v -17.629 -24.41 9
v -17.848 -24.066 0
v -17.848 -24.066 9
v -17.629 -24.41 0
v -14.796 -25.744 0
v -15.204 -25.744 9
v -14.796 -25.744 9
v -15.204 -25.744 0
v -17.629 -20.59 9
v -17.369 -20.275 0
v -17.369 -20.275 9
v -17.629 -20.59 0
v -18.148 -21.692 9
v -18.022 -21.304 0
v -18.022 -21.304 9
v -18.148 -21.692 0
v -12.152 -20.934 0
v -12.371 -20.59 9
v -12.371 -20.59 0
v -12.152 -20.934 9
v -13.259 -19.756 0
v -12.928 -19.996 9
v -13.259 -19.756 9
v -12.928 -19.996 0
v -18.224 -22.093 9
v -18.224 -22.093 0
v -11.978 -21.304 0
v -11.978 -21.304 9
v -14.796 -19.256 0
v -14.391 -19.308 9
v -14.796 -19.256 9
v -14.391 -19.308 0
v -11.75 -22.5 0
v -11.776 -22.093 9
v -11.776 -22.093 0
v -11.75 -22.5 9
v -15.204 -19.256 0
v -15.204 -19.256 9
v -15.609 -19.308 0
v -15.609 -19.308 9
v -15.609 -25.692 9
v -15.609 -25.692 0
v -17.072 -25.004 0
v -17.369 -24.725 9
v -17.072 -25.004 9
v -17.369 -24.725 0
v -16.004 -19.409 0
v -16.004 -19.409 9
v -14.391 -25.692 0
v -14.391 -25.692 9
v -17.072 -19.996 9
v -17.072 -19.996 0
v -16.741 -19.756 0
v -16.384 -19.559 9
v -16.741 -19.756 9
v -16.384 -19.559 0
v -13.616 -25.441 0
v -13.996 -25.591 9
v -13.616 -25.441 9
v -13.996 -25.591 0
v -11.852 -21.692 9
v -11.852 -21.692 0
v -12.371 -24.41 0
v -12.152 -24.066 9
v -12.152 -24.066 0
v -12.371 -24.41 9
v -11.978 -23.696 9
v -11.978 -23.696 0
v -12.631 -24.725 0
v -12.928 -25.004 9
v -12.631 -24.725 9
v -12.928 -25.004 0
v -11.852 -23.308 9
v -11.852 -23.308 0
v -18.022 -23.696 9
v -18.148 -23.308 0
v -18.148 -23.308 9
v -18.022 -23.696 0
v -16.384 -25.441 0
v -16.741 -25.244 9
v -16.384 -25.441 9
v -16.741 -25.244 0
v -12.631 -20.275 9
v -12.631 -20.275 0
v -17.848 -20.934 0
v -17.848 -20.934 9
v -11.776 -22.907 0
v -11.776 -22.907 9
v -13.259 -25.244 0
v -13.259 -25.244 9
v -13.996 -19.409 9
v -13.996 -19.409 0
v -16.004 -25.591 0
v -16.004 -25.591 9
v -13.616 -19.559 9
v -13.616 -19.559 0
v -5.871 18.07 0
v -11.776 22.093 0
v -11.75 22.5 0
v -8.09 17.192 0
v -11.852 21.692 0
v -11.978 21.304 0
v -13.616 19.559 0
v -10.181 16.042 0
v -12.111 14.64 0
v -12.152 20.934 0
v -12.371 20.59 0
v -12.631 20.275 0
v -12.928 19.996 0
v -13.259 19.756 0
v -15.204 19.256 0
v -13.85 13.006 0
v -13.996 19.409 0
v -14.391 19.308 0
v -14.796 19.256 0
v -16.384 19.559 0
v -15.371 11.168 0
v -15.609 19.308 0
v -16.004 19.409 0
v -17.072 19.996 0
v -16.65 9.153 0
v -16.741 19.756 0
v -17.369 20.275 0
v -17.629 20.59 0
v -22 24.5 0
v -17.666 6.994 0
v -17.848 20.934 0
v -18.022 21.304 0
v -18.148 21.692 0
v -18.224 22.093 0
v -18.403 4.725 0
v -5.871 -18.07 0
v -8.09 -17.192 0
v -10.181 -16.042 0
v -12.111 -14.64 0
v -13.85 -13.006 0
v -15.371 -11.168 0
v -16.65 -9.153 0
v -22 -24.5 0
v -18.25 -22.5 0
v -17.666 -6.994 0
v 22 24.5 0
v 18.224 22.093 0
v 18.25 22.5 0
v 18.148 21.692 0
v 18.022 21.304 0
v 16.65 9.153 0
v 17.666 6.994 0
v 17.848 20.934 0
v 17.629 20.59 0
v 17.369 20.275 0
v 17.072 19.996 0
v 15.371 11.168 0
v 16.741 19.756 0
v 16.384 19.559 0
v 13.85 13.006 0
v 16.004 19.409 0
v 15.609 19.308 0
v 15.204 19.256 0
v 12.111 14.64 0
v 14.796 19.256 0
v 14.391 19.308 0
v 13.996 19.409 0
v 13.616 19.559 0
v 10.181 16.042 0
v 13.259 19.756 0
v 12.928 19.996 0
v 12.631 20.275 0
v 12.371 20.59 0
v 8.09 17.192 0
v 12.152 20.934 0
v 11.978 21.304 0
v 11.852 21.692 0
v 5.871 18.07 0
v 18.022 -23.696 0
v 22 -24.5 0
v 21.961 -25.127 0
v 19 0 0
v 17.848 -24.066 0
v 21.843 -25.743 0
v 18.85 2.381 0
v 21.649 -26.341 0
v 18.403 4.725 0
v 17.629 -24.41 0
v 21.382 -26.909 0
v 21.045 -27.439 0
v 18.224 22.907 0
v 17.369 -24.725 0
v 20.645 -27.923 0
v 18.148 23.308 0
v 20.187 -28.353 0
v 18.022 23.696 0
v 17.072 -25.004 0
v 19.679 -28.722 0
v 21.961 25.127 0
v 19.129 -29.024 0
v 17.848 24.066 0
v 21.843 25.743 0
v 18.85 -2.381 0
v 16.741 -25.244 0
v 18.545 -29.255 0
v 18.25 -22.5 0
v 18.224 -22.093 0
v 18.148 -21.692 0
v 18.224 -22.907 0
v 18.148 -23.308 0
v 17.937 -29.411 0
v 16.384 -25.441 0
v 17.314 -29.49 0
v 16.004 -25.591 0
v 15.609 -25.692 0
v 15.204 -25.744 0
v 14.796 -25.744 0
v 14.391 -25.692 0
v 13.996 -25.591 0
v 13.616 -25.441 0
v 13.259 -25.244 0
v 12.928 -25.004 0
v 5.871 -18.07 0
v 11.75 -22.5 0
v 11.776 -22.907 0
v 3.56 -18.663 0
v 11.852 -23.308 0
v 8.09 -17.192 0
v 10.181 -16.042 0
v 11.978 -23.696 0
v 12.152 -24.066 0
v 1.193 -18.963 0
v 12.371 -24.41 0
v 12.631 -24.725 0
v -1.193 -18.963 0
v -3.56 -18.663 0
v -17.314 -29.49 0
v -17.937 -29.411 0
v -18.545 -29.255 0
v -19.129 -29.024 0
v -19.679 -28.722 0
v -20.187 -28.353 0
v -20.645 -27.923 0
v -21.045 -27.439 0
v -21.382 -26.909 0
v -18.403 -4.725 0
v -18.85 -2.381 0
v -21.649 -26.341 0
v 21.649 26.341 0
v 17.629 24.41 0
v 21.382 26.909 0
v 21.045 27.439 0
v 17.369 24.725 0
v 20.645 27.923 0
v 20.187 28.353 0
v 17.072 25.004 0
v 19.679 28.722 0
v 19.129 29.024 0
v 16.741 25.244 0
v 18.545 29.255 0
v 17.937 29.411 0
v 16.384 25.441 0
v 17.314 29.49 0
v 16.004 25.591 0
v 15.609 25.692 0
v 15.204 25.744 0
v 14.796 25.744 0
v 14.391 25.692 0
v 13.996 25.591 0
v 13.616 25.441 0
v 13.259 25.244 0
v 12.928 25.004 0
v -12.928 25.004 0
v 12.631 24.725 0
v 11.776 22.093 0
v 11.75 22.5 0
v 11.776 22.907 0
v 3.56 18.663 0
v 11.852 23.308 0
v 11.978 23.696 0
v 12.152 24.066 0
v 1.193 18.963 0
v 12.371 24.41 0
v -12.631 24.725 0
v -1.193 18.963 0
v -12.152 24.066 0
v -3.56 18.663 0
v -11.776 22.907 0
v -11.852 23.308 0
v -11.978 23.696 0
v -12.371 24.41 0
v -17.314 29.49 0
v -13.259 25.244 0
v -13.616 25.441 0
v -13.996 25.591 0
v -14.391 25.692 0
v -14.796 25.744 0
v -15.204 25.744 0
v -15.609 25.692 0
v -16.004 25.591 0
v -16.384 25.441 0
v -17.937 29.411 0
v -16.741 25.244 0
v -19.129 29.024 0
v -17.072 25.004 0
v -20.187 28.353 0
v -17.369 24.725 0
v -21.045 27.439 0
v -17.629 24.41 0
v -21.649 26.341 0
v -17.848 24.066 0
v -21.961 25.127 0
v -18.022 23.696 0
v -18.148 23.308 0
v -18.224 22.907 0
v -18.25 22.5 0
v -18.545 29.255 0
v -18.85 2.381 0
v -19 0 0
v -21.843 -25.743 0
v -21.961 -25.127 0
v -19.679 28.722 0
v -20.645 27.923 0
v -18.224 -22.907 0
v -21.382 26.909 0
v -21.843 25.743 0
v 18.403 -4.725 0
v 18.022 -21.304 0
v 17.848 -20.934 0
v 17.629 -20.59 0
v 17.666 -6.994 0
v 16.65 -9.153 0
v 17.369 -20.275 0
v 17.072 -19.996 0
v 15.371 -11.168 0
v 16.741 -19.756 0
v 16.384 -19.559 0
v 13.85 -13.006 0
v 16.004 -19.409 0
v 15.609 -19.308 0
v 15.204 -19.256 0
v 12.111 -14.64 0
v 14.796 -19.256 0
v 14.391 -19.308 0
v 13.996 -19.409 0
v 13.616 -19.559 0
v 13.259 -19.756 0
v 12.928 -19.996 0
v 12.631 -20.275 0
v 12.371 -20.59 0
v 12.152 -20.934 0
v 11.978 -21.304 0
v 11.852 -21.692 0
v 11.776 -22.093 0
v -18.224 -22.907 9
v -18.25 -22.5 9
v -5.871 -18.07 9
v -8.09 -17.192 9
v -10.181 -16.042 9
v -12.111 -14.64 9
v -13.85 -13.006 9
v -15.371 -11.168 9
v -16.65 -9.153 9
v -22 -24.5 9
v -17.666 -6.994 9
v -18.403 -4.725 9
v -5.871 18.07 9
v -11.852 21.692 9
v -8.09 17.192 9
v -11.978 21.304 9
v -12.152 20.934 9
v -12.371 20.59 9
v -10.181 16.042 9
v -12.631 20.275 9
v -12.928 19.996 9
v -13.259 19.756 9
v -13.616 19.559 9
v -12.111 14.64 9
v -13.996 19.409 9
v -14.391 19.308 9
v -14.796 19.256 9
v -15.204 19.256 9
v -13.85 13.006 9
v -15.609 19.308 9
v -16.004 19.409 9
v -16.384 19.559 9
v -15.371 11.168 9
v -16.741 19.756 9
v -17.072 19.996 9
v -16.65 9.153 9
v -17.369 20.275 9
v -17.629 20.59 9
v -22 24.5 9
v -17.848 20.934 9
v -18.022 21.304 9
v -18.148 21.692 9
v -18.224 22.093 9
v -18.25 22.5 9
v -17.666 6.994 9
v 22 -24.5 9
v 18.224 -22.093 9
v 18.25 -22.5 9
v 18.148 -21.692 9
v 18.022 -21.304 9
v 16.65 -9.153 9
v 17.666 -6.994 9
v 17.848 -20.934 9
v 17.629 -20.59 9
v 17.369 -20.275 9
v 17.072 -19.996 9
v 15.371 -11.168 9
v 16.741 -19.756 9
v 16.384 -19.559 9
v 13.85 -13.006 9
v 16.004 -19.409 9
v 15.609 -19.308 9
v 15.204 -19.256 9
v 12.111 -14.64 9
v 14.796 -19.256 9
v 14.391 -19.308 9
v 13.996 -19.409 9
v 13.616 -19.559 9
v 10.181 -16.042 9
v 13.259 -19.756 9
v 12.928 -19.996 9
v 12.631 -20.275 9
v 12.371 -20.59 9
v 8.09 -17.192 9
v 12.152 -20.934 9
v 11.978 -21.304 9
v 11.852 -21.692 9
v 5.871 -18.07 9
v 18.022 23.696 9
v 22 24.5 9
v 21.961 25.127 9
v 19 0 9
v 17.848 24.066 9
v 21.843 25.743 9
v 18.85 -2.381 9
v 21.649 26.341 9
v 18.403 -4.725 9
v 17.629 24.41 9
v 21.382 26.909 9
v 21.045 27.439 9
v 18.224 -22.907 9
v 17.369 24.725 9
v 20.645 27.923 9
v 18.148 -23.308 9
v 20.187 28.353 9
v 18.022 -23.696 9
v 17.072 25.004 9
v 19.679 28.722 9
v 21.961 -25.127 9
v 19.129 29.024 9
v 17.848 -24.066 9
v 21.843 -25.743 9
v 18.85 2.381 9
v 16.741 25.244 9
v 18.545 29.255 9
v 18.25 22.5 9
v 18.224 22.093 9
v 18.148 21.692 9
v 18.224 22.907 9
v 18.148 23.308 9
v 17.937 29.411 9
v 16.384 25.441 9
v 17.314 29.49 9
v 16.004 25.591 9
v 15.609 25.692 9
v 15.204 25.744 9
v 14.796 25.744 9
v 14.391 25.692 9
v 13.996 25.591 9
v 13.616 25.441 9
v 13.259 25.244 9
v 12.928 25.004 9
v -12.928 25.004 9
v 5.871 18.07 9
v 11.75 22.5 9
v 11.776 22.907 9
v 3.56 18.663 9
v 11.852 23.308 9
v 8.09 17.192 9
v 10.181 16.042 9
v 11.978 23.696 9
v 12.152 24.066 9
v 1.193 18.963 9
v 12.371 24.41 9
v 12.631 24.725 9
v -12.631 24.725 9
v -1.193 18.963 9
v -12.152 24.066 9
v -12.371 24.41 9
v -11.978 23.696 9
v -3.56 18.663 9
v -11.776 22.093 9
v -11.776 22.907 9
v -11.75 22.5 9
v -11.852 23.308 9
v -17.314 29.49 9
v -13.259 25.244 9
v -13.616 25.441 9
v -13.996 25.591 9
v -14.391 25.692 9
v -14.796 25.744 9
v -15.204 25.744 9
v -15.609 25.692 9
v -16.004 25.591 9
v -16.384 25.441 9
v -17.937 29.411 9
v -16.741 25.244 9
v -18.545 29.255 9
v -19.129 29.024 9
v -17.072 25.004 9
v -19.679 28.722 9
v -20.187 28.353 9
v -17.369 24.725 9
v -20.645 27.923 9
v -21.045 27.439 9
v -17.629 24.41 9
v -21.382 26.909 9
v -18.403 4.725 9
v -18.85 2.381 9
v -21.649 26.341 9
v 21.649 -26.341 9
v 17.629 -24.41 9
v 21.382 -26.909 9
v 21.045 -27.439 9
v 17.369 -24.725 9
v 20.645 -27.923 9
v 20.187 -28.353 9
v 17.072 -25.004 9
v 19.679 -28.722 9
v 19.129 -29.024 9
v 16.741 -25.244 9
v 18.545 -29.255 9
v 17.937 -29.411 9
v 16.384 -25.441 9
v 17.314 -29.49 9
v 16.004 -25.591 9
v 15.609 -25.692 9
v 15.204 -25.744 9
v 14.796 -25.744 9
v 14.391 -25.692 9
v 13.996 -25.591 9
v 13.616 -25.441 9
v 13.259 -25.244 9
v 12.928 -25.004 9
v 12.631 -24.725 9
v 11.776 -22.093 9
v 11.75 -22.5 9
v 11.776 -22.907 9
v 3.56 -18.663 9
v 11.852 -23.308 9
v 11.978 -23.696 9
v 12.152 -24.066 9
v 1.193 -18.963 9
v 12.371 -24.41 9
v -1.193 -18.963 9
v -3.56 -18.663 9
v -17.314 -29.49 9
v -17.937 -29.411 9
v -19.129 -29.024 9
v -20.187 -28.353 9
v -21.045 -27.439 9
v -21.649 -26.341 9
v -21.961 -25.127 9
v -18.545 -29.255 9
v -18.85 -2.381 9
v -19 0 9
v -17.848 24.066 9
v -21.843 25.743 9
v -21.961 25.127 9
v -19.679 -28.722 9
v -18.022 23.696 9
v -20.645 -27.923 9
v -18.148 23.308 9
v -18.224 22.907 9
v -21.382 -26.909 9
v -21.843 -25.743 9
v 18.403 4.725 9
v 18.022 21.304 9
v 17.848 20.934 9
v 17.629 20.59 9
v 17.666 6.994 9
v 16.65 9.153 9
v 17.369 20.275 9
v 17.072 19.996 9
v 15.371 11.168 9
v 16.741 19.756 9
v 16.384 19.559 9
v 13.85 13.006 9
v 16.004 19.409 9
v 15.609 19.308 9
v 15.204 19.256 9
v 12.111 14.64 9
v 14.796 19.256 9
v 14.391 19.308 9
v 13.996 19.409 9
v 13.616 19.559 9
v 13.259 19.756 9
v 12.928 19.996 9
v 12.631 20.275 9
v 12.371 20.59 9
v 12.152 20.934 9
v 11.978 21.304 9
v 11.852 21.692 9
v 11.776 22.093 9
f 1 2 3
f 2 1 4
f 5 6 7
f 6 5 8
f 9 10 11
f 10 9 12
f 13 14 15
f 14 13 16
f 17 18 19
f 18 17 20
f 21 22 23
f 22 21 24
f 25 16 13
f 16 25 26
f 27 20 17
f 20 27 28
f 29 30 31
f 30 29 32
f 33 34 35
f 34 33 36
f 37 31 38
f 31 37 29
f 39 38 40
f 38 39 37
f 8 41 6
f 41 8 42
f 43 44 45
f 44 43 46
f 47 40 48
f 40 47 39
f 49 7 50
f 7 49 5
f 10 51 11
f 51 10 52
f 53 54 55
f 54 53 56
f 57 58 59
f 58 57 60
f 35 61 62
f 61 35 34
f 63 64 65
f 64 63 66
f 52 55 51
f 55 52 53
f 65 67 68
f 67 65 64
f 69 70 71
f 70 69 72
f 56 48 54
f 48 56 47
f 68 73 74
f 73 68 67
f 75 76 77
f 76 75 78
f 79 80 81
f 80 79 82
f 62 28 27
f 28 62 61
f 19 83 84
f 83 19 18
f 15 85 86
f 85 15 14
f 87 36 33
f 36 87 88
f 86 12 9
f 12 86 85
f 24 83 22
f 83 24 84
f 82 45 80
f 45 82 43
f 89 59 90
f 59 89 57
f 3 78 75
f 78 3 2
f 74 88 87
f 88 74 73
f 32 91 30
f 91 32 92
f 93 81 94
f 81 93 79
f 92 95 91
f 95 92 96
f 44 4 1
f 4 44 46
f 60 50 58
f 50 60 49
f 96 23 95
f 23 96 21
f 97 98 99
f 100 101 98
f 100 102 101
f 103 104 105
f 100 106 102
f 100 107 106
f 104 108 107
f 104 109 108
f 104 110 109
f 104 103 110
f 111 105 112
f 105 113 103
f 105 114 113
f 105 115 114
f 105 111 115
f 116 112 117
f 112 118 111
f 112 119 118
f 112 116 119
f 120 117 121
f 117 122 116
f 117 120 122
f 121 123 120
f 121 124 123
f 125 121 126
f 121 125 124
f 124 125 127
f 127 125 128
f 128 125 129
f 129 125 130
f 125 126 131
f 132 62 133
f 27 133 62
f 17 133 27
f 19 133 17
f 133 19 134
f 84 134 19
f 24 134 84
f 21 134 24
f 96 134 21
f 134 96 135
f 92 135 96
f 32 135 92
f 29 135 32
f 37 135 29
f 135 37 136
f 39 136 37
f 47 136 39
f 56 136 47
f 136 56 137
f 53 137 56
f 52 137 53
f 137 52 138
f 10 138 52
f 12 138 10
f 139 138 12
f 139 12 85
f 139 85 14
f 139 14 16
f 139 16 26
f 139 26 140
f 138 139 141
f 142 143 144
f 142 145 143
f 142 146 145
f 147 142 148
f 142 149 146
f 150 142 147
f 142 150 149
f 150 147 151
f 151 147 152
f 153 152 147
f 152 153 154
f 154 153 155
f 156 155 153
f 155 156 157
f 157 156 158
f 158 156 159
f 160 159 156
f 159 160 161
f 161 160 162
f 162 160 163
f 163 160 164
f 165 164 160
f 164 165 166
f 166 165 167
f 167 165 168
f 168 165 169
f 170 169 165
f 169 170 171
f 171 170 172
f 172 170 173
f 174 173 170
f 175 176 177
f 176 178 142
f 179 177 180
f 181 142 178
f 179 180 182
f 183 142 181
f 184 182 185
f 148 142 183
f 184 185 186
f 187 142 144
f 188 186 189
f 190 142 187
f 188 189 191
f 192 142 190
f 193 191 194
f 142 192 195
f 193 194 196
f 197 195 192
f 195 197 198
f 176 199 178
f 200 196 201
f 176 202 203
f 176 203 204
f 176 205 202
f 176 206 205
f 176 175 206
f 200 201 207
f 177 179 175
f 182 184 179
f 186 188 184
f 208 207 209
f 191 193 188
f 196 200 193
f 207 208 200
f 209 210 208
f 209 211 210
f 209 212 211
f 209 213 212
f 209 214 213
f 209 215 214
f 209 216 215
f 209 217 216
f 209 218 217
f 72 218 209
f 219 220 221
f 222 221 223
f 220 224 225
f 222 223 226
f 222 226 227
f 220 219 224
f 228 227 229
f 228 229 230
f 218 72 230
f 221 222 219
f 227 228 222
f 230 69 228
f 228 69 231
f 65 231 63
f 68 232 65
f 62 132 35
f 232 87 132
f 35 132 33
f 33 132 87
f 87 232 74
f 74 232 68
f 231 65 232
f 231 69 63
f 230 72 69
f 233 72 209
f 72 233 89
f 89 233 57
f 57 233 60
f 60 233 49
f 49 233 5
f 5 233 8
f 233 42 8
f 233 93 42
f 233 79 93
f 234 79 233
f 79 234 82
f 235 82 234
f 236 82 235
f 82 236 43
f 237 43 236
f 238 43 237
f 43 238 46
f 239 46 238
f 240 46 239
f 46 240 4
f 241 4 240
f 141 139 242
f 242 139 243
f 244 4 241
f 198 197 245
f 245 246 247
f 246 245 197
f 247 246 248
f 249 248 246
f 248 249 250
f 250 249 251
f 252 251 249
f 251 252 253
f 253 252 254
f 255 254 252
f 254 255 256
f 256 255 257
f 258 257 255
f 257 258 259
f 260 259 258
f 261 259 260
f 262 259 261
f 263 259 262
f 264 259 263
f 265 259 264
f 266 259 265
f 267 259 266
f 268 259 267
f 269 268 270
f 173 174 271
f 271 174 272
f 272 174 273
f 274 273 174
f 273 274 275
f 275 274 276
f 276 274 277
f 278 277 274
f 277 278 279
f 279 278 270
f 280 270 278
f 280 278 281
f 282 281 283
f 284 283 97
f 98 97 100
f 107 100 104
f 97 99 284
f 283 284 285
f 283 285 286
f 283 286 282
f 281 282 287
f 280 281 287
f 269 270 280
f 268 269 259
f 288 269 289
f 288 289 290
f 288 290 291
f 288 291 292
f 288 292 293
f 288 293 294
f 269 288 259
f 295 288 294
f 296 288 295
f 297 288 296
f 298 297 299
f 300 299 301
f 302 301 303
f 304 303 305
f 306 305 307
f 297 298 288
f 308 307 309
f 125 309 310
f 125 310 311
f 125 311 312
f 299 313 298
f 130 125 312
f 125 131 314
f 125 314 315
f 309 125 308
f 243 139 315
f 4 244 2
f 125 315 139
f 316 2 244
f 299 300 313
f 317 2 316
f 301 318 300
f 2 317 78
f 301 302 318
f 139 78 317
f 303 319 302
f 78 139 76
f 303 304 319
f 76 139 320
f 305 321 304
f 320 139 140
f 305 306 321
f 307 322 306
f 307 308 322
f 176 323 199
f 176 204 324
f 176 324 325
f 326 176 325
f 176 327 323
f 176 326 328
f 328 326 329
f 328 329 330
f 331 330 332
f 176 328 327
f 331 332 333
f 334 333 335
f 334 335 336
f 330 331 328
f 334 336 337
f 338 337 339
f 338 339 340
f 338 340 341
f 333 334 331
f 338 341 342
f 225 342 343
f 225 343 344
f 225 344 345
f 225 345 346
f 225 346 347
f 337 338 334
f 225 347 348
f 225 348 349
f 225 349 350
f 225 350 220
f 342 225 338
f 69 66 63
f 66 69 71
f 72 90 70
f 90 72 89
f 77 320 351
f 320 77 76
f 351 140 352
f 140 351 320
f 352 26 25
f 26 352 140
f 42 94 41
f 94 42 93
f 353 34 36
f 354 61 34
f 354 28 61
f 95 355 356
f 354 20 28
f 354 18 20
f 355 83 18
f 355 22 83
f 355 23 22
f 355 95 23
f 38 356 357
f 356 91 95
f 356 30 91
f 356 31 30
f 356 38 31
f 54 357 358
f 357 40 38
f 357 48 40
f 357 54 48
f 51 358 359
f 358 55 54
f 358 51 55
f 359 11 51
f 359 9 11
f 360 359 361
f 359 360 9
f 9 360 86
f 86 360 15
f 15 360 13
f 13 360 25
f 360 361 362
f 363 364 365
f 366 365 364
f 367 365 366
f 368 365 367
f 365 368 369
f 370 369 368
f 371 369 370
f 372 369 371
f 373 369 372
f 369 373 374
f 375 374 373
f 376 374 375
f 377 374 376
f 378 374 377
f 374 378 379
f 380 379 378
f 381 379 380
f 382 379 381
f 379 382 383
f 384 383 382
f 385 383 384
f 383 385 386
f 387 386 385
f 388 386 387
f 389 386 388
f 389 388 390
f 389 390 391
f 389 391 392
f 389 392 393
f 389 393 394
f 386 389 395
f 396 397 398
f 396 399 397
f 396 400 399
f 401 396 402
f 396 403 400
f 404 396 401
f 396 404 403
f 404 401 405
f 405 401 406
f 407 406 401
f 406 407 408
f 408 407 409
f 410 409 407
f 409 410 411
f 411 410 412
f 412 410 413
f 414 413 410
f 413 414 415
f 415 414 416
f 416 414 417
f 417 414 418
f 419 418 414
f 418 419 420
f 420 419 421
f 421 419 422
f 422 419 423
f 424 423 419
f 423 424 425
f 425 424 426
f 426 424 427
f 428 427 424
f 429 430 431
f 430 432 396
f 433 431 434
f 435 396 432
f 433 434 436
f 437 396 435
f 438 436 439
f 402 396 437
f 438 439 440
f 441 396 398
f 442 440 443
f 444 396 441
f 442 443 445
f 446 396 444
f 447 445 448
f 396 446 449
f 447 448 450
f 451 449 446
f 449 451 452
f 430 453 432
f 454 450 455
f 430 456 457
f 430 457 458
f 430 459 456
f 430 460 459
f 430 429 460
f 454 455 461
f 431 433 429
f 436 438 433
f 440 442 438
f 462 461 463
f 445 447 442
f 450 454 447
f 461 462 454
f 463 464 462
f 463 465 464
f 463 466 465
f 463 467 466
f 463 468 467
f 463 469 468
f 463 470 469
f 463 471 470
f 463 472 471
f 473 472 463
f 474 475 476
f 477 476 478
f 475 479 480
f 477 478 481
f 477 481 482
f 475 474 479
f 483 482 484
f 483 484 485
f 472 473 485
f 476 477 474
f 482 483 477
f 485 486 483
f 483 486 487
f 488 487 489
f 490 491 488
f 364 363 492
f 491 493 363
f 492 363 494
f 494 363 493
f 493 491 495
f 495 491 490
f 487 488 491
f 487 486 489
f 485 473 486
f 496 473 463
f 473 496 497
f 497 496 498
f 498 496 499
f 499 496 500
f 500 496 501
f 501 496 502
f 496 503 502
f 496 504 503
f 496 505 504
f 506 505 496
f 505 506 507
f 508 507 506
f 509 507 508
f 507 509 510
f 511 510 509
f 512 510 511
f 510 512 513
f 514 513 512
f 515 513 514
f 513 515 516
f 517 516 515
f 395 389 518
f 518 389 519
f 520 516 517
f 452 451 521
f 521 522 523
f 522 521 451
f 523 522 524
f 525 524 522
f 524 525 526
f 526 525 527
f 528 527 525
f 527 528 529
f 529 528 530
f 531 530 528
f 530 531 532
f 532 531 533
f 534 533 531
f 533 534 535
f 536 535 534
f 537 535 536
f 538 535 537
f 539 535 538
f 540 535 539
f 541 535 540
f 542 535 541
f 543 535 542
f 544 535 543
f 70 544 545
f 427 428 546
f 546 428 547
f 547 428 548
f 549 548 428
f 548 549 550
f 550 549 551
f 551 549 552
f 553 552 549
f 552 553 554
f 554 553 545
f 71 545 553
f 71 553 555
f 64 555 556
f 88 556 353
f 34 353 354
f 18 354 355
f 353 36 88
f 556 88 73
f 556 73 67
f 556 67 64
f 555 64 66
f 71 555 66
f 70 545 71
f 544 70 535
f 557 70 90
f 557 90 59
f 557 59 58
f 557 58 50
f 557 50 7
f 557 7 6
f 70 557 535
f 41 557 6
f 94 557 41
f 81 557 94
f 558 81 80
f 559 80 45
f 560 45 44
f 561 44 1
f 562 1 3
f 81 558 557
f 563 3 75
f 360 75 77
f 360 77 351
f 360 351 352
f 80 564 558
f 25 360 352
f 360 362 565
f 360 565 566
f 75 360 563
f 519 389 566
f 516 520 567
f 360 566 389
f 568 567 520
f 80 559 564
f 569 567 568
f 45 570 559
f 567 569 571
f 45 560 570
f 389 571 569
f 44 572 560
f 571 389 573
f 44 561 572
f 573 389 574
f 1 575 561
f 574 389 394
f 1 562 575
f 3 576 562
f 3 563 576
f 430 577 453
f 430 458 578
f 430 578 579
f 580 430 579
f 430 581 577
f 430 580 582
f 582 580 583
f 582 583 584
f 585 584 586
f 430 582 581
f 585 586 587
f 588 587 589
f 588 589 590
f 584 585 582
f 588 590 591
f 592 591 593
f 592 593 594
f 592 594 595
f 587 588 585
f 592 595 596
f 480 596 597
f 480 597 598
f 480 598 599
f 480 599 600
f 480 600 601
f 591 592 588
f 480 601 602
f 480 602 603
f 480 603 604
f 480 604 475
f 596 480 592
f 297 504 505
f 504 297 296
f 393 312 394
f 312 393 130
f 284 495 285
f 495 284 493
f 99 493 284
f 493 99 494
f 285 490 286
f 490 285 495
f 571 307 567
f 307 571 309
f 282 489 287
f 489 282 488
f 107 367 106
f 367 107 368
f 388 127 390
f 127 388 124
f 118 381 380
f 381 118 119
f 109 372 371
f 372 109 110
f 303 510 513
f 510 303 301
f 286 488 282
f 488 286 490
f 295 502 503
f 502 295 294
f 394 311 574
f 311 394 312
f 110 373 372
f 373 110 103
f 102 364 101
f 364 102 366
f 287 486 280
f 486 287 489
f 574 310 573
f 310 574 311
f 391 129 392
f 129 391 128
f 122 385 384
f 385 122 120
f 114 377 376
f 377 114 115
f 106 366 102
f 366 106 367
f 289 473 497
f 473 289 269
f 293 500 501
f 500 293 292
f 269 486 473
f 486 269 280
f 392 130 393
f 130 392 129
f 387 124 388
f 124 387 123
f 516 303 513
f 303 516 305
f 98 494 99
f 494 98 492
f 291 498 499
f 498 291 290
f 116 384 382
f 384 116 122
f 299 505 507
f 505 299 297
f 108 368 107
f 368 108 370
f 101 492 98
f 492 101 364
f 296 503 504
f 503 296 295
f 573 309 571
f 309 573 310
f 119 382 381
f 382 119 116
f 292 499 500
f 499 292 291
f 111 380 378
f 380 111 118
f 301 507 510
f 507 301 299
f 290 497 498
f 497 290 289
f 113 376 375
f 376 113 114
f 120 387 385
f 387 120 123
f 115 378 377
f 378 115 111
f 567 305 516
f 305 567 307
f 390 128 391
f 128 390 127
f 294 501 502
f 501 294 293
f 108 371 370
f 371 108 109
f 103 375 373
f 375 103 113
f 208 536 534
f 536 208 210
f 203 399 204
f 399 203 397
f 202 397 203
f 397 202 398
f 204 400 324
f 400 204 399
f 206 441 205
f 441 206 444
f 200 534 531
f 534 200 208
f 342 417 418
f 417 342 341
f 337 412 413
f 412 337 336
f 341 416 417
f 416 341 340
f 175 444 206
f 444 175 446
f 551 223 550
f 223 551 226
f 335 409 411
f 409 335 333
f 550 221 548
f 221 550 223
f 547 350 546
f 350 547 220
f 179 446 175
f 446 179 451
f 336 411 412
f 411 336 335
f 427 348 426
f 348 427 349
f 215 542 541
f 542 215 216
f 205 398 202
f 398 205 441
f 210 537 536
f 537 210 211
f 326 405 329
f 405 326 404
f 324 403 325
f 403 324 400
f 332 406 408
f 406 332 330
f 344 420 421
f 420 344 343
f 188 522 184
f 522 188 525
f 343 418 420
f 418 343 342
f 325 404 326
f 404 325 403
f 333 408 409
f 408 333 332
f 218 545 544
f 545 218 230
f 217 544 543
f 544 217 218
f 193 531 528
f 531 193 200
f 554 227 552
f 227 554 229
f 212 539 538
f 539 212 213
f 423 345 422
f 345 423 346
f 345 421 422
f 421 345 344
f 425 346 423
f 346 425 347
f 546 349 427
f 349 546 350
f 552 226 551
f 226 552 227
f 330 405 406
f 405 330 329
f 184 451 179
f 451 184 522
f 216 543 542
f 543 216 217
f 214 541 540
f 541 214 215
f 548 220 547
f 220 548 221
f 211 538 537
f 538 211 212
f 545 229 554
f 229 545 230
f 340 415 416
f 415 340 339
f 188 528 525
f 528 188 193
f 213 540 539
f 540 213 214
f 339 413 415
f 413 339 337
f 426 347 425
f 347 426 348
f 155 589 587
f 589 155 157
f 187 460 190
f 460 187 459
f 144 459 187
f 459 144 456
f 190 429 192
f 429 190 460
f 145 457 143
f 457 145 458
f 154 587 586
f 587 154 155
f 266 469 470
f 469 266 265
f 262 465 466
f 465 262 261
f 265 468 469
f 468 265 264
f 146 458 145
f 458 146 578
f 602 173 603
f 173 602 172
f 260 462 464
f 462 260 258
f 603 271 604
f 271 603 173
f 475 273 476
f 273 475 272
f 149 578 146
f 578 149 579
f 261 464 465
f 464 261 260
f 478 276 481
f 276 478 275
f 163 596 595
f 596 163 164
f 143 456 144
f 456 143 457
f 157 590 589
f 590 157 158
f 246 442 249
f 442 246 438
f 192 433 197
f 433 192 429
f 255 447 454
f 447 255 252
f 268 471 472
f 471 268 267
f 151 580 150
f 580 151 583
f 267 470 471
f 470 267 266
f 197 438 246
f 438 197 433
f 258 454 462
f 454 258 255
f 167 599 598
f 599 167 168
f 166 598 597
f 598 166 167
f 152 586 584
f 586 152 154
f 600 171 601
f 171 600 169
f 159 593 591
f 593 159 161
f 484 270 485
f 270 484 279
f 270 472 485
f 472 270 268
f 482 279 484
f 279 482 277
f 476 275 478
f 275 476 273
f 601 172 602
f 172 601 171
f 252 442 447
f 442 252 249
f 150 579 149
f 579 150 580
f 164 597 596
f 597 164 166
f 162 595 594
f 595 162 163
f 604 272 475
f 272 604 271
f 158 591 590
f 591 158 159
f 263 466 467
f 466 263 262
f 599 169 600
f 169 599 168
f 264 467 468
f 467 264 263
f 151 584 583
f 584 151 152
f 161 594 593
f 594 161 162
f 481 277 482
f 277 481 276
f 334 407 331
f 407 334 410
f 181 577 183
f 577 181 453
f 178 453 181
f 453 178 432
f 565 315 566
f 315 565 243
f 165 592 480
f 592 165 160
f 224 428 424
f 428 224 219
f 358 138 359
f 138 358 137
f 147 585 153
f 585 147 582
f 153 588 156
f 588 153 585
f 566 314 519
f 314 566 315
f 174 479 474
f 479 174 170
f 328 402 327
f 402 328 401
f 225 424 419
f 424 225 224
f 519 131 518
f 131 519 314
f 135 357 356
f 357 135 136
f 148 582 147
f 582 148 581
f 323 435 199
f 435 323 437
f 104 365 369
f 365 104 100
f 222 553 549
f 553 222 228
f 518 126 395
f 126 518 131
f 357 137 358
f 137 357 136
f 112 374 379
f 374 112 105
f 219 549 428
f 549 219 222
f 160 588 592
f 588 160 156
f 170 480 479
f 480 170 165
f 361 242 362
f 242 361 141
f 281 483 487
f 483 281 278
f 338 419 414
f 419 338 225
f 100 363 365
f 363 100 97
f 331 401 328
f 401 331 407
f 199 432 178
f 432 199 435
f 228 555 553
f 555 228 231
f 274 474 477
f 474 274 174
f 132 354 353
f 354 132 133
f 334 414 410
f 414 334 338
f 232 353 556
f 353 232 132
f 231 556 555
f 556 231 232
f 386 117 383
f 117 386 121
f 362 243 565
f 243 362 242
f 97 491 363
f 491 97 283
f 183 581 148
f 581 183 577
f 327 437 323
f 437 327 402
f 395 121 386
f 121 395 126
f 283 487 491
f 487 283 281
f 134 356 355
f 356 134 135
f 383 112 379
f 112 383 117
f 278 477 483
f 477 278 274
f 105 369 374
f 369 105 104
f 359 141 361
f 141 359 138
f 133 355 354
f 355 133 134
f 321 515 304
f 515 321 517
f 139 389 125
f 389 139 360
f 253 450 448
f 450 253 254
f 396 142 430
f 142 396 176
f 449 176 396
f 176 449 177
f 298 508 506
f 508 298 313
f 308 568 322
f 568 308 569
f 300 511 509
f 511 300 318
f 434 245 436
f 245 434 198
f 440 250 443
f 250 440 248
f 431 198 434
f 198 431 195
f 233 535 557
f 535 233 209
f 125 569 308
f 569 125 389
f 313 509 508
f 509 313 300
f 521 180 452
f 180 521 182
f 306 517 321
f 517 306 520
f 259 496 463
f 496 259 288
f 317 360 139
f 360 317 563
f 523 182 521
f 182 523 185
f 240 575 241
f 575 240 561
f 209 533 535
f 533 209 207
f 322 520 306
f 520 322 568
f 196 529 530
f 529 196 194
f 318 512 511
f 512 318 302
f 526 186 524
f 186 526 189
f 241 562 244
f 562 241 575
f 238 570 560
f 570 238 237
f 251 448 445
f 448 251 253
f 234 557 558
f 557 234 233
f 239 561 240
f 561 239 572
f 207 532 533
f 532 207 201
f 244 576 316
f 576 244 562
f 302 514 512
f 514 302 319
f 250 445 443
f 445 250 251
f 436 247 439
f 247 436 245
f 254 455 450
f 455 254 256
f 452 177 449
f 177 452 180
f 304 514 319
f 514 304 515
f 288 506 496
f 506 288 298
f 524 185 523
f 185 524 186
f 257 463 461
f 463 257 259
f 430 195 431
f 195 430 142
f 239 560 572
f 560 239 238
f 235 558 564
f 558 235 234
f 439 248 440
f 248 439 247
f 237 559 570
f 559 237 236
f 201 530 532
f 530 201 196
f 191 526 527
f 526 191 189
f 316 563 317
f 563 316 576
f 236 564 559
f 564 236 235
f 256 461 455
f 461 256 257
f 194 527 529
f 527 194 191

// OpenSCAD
$fn = 50;

difference() {
	union() {
		hull() {
			translate(v = [-17.0, 24.5, 0]) {
				cylinder(h = 9, r = 5);
			}
			translate(v = [17.0, 24.5, 0]) {
				cylinder(h = 9, r = 5);
			}
			translate(v = [-17.0, -24.5, 0]) {
				cylinder(h = 9, r = 5);
			}
			translate(v = [17.0, -24.5, 0]) {
				cylinder(h = 9, r = 5);
			}
		}
	}
	union() {
		translate(v = [-15.0, -22.5, 0]) {
			cylinder(h = 9, r = 3.25);
		}
		translate(v = [-15.0, 22.5, 0]) {
			cylinder(h = 9, r = 3.25);
		}
		translate(v = [15.0, -22.5, 0]) {
			cylinder(h = 9, r = 3.25);
		}
		translate(v = [15.0, 22.5, 0]) {
			cylinder(h = 9, r = 3.25);
		}
		cylinder(h = 9, r = 19.0);
	}
}
